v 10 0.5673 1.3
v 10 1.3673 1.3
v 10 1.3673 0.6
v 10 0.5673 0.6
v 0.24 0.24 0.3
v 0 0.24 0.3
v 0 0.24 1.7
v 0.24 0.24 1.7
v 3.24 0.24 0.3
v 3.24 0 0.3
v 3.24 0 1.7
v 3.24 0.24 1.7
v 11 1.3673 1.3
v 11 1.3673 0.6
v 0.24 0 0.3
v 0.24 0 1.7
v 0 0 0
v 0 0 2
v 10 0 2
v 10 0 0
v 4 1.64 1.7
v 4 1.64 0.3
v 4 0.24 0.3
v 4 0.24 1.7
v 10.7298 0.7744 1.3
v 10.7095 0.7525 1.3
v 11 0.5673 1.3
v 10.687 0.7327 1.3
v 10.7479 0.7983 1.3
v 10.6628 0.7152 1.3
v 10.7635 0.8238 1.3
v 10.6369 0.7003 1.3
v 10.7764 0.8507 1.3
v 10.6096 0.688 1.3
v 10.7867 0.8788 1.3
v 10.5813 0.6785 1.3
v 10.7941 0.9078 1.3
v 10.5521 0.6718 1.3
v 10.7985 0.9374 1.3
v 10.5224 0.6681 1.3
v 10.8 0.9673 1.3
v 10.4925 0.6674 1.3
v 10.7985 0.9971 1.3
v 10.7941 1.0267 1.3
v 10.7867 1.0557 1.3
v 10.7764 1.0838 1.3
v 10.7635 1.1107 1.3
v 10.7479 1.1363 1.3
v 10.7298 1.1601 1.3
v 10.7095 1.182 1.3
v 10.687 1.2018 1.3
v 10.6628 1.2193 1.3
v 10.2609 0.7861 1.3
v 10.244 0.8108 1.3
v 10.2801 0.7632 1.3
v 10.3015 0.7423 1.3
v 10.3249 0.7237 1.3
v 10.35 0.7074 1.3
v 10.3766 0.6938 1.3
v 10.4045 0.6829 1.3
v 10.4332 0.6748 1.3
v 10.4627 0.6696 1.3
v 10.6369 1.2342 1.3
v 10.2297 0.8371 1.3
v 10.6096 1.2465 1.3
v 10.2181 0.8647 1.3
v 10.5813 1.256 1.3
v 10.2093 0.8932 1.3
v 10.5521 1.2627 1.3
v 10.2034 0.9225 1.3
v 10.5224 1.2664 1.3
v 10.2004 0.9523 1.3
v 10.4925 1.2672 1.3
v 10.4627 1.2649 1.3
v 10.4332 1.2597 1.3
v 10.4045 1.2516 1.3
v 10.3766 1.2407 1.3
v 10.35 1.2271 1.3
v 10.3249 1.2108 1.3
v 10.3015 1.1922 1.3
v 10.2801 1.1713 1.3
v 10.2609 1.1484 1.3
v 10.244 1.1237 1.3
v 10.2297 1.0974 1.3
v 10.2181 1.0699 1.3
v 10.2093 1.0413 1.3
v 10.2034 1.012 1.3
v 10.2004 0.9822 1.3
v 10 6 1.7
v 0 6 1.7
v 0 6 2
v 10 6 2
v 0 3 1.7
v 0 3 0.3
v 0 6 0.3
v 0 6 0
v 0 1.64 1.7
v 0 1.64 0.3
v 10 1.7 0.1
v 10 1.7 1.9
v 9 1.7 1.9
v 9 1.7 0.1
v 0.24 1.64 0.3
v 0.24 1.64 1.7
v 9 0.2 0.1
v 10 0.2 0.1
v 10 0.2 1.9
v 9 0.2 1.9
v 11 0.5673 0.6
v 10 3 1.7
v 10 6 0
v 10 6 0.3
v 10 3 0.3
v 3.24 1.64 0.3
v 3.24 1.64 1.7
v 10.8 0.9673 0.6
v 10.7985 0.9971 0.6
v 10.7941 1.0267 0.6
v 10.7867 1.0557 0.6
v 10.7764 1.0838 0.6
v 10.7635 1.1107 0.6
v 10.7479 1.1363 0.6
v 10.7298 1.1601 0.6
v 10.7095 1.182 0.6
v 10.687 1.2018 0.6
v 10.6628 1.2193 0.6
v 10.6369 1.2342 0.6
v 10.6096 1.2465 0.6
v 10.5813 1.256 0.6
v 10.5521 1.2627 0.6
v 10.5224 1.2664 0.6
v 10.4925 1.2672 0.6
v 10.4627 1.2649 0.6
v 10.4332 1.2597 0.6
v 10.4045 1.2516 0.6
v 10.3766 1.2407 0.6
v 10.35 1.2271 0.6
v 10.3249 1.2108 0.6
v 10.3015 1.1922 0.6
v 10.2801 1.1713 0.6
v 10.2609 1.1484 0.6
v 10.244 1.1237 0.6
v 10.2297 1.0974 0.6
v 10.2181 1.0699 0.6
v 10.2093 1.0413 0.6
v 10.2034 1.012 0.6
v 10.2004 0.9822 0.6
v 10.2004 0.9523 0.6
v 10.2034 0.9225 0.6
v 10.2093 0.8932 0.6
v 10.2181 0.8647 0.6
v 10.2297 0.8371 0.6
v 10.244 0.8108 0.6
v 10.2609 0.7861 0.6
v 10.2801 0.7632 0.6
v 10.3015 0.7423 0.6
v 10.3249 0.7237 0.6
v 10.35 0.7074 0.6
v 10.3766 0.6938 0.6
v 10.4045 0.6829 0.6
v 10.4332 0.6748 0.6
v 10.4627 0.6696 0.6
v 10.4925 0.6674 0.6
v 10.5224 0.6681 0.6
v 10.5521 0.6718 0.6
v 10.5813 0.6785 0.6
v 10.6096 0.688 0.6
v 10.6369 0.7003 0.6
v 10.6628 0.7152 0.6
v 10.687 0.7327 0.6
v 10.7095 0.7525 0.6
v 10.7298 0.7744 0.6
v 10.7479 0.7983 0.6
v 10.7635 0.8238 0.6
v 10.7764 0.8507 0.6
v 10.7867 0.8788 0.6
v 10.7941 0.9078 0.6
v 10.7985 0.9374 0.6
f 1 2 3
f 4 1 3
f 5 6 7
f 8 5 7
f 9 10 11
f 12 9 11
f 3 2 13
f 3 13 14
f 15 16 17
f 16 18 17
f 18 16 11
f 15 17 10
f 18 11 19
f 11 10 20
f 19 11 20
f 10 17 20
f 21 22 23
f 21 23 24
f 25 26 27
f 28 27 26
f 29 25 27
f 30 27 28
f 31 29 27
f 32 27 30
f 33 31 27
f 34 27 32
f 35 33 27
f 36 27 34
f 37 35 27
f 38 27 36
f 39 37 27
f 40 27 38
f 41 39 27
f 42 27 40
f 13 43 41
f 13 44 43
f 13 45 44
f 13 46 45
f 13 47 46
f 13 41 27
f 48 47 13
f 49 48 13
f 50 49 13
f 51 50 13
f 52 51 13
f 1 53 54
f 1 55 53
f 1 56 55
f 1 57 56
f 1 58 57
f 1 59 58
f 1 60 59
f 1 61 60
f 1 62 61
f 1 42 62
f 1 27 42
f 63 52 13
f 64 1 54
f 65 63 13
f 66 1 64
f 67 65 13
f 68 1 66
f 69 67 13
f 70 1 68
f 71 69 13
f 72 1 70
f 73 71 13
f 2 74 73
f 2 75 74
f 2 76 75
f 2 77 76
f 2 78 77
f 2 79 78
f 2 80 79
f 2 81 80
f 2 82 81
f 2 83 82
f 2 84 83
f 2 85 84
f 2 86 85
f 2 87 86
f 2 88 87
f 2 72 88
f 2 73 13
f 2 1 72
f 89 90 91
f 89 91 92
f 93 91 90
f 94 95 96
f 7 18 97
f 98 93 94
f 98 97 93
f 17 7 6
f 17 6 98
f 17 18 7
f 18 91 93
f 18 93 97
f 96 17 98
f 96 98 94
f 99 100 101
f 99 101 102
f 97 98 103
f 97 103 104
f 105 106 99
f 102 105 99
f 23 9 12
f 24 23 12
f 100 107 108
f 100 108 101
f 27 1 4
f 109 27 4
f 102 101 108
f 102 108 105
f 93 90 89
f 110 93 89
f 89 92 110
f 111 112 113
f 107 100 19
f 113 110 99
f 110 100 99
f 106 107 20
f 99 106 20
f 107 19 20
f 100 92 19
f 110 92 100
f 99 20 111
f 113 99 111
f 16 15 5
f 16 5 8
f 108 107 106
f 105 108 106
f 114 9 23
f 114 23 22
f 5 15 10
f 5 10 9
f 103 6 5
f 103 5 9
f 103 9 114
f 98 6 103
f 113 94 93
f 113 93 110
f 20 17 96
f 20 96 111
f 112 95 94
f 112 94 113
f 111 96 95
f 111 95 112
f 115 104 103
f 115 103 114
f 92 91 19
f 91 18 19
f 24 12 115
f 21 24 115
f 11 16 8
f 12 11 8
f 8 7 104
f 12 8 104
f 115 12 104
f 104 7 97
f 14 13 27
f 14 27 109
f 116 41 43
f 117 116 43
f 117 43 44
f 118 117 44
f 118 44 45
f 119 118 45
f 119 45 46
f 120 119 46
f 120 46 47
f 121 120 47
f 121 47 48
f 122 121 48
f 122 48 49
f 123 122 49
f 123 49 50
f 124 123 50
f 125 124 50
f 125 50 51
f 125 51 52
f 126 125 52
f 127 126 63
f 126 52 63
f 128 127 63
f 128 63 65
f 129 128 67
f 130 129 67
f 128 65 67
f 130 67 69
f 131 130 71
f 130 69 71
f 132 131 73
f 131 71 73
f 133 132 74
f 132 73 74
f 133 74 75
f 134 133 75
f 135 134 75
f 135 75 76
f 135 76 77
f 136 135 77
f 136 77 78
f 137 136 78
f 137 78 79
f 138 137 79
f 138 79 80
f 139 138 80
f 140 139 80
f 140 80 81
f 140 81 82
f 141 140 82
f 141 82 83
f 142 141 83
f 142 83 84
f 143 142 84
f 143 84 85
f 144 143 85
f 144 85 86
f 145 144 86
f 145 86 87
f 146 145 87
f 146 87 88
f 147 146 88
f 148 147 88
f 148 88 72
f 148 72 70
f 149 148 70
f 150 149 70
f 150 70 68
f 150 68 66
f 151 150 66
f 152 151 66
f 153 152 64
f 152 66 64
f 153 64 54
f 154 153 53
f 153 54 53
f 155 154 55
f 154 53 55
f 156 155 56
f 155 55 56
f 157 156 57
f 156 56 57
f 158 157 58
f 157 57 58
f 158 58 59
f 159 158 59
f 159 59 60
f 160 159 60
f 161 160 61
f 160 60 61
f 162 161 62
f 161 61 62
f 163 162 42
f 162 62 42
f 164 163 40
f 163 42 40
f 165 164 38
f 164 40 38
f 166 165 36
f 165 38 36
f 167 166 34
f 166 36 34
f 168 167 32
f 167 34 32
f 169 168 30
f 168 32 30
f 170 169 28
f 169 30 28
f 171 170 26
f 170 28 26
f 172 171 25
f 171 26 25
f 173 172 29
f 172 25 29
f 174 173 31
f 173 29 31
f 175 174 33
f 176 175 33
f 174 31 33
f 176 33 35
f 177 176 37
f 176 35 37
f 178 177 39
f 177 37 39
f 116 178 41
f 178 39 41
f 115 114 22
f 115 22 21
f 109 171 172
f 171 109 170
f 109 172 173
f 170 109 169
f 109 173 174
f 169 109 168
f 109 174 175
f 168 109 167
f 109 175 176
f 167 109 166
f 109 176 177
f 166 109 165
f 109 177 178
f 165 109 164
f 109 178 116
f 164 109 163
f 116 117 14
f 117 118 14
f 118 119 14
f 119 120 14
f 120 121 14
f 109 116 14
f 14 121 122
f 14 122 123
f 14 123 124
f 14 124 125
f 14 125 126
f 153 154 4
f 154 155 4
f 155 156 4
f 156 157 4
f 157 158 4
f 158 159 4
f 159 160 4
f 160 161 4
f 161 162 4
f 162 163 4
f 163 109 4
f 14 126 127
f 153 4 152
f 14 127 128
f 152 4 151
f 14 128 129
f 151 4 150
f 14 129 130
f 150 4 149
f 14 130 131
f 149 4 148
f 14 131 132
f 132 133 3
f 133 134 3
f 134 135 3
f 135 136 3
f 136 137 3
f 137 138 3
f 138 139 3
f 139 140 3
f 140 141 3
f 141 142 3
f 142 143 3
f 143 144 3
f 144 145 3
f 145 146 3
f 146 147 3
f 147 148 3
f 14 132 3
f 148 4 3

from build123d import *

# Parameters (mm, degrees)
SKETCH2_W            = 10
SKETCH2_H            = 2
BOSS_EXTRUDE6_DEPTH  = 2
SKETCH7_W            = 0.7
SKETCH7_H            = 0.8
BOSS_EXTRUDE9_DEPTH  = 1
SKETCH8_R            = 0.3
CUT_EXTRUDE1_DEPTH   = 1
SKETCH12_W           = 10
SKETCH12_H           = 2
BOSS_EXTRUDE13_DEPTH = 4
SKETCH13_W           = 1.8
SKETCH13_H           = 1.5
CUT_EXTRUDE5_DEPTH   = 1
SKETCH14_W           = 10
SKETCH14_H           = 1.4
CUT_EXTRUDE7_DEPTH   = 3
SKETCH15_W           = 1.4
SKETCH15_H           = 1.4
CUT_EXTRUDE9_DEPTH   = 4
SKETCH16_W           = 3
SKETCH16_H           = 1.4
CUT_EXTRUDE10_DEPTH  = 1.639962


with BuildPart() as part:
    # Sketch2 → Boss-Extrude6 (new body)
    with BuildSketch(Plane.XY):
        with Locations((5, 1)):
            Rectangle(SKETCH2_W, SKETCH2_H)
    extrude(amount=BOSS_EXTRUDE6_DEPTH)

    # Sketch7 → Boss-Extrude9 (add)
    with BuildSketch(Plane(origin=(10, 0, 0), x_dir=(0, 0, -1), z_dir=(1, 0, 0))):
        with Locations((-0.95, 0.967257018)):
            Rectangle(SKETCH7_W, SKETCH7_H)
    extrude(amount=BOSS_EXTRUDE9_DEPTH)

    # Sketch8 → Cut-Extrude1 (cut)
    with BuildSketch(Plane.XY.offset(1.3)):
        with Locations((10.5, 0.967257018)):
            Circle(SKETCH8_R)
    extrude(amount=-CUT_EXTRUDE1_DEPTH, mode=Mode.SUBTRACT)

    # Sketch12 → Boss-Extrude13 (add)
    with BuildSketch(Plane(origin=(0, 2, 0), x_dir=(1, 0, 0), z_dir=(0, 1, 0))):
        with Locations((5, -1)):
            Rectangle(SKETCH12_W, SKETCH12_H)
    extrude(amount=BOSS_EXTRUDE13_DEPTH)

    # Sketch13 → Cut-Extrude5 (cut)
    with BuildSketch(Plane(origin=(10, 0, 0), x_dir=(0, 0, -1), z_dir=(1, 0, 0))):
        with Locations((-1, 0.95)):
            Rectangle(SKETCH13_W, SKETCH13_H)
    extrude(amount=-CUT_EXTRUDE5_DEPTH, mode=Mode.SUBTRACT)

    # Sketch14 → Cut-Extrude7 (cut)
    with BuildSketch(Plane(origin=(0, 6, 0), x_dir=(1, 0, 0), z_dir=(0, 1, 0))):
        with Locations((5, -1)):
            Rectangle(SKETCH14_W, SKETCH14_H)
    extrude(amount=-CUT_EXTRUDE7_DEPTH, mode=Mode.SUBTRACT)

    # Sketch15 → Cut-Extrude9 (cut)
    with BuildSketch(Plane.ZY):
        with Locations((1, 0.939962181)):
            Rectangle(SKETCH15_W, SKETCH15_H)
    extrude(amount=-CUT_EXTRUDE9_DEPTH, mode=Mode.SUBTRACT)

    # Sketch16 → Cut-Extrude10 (cut)
    with BuildSketch(Plane.XZ):
        with Locations((1.74, 1)):
            Rectangle(SKETCH16_W, SKETCH16_H)
    extrude(amount=-CUT_EXTRUDE10_DEPTH, mode=Mode.SUBTRACT)


solid = part.part
